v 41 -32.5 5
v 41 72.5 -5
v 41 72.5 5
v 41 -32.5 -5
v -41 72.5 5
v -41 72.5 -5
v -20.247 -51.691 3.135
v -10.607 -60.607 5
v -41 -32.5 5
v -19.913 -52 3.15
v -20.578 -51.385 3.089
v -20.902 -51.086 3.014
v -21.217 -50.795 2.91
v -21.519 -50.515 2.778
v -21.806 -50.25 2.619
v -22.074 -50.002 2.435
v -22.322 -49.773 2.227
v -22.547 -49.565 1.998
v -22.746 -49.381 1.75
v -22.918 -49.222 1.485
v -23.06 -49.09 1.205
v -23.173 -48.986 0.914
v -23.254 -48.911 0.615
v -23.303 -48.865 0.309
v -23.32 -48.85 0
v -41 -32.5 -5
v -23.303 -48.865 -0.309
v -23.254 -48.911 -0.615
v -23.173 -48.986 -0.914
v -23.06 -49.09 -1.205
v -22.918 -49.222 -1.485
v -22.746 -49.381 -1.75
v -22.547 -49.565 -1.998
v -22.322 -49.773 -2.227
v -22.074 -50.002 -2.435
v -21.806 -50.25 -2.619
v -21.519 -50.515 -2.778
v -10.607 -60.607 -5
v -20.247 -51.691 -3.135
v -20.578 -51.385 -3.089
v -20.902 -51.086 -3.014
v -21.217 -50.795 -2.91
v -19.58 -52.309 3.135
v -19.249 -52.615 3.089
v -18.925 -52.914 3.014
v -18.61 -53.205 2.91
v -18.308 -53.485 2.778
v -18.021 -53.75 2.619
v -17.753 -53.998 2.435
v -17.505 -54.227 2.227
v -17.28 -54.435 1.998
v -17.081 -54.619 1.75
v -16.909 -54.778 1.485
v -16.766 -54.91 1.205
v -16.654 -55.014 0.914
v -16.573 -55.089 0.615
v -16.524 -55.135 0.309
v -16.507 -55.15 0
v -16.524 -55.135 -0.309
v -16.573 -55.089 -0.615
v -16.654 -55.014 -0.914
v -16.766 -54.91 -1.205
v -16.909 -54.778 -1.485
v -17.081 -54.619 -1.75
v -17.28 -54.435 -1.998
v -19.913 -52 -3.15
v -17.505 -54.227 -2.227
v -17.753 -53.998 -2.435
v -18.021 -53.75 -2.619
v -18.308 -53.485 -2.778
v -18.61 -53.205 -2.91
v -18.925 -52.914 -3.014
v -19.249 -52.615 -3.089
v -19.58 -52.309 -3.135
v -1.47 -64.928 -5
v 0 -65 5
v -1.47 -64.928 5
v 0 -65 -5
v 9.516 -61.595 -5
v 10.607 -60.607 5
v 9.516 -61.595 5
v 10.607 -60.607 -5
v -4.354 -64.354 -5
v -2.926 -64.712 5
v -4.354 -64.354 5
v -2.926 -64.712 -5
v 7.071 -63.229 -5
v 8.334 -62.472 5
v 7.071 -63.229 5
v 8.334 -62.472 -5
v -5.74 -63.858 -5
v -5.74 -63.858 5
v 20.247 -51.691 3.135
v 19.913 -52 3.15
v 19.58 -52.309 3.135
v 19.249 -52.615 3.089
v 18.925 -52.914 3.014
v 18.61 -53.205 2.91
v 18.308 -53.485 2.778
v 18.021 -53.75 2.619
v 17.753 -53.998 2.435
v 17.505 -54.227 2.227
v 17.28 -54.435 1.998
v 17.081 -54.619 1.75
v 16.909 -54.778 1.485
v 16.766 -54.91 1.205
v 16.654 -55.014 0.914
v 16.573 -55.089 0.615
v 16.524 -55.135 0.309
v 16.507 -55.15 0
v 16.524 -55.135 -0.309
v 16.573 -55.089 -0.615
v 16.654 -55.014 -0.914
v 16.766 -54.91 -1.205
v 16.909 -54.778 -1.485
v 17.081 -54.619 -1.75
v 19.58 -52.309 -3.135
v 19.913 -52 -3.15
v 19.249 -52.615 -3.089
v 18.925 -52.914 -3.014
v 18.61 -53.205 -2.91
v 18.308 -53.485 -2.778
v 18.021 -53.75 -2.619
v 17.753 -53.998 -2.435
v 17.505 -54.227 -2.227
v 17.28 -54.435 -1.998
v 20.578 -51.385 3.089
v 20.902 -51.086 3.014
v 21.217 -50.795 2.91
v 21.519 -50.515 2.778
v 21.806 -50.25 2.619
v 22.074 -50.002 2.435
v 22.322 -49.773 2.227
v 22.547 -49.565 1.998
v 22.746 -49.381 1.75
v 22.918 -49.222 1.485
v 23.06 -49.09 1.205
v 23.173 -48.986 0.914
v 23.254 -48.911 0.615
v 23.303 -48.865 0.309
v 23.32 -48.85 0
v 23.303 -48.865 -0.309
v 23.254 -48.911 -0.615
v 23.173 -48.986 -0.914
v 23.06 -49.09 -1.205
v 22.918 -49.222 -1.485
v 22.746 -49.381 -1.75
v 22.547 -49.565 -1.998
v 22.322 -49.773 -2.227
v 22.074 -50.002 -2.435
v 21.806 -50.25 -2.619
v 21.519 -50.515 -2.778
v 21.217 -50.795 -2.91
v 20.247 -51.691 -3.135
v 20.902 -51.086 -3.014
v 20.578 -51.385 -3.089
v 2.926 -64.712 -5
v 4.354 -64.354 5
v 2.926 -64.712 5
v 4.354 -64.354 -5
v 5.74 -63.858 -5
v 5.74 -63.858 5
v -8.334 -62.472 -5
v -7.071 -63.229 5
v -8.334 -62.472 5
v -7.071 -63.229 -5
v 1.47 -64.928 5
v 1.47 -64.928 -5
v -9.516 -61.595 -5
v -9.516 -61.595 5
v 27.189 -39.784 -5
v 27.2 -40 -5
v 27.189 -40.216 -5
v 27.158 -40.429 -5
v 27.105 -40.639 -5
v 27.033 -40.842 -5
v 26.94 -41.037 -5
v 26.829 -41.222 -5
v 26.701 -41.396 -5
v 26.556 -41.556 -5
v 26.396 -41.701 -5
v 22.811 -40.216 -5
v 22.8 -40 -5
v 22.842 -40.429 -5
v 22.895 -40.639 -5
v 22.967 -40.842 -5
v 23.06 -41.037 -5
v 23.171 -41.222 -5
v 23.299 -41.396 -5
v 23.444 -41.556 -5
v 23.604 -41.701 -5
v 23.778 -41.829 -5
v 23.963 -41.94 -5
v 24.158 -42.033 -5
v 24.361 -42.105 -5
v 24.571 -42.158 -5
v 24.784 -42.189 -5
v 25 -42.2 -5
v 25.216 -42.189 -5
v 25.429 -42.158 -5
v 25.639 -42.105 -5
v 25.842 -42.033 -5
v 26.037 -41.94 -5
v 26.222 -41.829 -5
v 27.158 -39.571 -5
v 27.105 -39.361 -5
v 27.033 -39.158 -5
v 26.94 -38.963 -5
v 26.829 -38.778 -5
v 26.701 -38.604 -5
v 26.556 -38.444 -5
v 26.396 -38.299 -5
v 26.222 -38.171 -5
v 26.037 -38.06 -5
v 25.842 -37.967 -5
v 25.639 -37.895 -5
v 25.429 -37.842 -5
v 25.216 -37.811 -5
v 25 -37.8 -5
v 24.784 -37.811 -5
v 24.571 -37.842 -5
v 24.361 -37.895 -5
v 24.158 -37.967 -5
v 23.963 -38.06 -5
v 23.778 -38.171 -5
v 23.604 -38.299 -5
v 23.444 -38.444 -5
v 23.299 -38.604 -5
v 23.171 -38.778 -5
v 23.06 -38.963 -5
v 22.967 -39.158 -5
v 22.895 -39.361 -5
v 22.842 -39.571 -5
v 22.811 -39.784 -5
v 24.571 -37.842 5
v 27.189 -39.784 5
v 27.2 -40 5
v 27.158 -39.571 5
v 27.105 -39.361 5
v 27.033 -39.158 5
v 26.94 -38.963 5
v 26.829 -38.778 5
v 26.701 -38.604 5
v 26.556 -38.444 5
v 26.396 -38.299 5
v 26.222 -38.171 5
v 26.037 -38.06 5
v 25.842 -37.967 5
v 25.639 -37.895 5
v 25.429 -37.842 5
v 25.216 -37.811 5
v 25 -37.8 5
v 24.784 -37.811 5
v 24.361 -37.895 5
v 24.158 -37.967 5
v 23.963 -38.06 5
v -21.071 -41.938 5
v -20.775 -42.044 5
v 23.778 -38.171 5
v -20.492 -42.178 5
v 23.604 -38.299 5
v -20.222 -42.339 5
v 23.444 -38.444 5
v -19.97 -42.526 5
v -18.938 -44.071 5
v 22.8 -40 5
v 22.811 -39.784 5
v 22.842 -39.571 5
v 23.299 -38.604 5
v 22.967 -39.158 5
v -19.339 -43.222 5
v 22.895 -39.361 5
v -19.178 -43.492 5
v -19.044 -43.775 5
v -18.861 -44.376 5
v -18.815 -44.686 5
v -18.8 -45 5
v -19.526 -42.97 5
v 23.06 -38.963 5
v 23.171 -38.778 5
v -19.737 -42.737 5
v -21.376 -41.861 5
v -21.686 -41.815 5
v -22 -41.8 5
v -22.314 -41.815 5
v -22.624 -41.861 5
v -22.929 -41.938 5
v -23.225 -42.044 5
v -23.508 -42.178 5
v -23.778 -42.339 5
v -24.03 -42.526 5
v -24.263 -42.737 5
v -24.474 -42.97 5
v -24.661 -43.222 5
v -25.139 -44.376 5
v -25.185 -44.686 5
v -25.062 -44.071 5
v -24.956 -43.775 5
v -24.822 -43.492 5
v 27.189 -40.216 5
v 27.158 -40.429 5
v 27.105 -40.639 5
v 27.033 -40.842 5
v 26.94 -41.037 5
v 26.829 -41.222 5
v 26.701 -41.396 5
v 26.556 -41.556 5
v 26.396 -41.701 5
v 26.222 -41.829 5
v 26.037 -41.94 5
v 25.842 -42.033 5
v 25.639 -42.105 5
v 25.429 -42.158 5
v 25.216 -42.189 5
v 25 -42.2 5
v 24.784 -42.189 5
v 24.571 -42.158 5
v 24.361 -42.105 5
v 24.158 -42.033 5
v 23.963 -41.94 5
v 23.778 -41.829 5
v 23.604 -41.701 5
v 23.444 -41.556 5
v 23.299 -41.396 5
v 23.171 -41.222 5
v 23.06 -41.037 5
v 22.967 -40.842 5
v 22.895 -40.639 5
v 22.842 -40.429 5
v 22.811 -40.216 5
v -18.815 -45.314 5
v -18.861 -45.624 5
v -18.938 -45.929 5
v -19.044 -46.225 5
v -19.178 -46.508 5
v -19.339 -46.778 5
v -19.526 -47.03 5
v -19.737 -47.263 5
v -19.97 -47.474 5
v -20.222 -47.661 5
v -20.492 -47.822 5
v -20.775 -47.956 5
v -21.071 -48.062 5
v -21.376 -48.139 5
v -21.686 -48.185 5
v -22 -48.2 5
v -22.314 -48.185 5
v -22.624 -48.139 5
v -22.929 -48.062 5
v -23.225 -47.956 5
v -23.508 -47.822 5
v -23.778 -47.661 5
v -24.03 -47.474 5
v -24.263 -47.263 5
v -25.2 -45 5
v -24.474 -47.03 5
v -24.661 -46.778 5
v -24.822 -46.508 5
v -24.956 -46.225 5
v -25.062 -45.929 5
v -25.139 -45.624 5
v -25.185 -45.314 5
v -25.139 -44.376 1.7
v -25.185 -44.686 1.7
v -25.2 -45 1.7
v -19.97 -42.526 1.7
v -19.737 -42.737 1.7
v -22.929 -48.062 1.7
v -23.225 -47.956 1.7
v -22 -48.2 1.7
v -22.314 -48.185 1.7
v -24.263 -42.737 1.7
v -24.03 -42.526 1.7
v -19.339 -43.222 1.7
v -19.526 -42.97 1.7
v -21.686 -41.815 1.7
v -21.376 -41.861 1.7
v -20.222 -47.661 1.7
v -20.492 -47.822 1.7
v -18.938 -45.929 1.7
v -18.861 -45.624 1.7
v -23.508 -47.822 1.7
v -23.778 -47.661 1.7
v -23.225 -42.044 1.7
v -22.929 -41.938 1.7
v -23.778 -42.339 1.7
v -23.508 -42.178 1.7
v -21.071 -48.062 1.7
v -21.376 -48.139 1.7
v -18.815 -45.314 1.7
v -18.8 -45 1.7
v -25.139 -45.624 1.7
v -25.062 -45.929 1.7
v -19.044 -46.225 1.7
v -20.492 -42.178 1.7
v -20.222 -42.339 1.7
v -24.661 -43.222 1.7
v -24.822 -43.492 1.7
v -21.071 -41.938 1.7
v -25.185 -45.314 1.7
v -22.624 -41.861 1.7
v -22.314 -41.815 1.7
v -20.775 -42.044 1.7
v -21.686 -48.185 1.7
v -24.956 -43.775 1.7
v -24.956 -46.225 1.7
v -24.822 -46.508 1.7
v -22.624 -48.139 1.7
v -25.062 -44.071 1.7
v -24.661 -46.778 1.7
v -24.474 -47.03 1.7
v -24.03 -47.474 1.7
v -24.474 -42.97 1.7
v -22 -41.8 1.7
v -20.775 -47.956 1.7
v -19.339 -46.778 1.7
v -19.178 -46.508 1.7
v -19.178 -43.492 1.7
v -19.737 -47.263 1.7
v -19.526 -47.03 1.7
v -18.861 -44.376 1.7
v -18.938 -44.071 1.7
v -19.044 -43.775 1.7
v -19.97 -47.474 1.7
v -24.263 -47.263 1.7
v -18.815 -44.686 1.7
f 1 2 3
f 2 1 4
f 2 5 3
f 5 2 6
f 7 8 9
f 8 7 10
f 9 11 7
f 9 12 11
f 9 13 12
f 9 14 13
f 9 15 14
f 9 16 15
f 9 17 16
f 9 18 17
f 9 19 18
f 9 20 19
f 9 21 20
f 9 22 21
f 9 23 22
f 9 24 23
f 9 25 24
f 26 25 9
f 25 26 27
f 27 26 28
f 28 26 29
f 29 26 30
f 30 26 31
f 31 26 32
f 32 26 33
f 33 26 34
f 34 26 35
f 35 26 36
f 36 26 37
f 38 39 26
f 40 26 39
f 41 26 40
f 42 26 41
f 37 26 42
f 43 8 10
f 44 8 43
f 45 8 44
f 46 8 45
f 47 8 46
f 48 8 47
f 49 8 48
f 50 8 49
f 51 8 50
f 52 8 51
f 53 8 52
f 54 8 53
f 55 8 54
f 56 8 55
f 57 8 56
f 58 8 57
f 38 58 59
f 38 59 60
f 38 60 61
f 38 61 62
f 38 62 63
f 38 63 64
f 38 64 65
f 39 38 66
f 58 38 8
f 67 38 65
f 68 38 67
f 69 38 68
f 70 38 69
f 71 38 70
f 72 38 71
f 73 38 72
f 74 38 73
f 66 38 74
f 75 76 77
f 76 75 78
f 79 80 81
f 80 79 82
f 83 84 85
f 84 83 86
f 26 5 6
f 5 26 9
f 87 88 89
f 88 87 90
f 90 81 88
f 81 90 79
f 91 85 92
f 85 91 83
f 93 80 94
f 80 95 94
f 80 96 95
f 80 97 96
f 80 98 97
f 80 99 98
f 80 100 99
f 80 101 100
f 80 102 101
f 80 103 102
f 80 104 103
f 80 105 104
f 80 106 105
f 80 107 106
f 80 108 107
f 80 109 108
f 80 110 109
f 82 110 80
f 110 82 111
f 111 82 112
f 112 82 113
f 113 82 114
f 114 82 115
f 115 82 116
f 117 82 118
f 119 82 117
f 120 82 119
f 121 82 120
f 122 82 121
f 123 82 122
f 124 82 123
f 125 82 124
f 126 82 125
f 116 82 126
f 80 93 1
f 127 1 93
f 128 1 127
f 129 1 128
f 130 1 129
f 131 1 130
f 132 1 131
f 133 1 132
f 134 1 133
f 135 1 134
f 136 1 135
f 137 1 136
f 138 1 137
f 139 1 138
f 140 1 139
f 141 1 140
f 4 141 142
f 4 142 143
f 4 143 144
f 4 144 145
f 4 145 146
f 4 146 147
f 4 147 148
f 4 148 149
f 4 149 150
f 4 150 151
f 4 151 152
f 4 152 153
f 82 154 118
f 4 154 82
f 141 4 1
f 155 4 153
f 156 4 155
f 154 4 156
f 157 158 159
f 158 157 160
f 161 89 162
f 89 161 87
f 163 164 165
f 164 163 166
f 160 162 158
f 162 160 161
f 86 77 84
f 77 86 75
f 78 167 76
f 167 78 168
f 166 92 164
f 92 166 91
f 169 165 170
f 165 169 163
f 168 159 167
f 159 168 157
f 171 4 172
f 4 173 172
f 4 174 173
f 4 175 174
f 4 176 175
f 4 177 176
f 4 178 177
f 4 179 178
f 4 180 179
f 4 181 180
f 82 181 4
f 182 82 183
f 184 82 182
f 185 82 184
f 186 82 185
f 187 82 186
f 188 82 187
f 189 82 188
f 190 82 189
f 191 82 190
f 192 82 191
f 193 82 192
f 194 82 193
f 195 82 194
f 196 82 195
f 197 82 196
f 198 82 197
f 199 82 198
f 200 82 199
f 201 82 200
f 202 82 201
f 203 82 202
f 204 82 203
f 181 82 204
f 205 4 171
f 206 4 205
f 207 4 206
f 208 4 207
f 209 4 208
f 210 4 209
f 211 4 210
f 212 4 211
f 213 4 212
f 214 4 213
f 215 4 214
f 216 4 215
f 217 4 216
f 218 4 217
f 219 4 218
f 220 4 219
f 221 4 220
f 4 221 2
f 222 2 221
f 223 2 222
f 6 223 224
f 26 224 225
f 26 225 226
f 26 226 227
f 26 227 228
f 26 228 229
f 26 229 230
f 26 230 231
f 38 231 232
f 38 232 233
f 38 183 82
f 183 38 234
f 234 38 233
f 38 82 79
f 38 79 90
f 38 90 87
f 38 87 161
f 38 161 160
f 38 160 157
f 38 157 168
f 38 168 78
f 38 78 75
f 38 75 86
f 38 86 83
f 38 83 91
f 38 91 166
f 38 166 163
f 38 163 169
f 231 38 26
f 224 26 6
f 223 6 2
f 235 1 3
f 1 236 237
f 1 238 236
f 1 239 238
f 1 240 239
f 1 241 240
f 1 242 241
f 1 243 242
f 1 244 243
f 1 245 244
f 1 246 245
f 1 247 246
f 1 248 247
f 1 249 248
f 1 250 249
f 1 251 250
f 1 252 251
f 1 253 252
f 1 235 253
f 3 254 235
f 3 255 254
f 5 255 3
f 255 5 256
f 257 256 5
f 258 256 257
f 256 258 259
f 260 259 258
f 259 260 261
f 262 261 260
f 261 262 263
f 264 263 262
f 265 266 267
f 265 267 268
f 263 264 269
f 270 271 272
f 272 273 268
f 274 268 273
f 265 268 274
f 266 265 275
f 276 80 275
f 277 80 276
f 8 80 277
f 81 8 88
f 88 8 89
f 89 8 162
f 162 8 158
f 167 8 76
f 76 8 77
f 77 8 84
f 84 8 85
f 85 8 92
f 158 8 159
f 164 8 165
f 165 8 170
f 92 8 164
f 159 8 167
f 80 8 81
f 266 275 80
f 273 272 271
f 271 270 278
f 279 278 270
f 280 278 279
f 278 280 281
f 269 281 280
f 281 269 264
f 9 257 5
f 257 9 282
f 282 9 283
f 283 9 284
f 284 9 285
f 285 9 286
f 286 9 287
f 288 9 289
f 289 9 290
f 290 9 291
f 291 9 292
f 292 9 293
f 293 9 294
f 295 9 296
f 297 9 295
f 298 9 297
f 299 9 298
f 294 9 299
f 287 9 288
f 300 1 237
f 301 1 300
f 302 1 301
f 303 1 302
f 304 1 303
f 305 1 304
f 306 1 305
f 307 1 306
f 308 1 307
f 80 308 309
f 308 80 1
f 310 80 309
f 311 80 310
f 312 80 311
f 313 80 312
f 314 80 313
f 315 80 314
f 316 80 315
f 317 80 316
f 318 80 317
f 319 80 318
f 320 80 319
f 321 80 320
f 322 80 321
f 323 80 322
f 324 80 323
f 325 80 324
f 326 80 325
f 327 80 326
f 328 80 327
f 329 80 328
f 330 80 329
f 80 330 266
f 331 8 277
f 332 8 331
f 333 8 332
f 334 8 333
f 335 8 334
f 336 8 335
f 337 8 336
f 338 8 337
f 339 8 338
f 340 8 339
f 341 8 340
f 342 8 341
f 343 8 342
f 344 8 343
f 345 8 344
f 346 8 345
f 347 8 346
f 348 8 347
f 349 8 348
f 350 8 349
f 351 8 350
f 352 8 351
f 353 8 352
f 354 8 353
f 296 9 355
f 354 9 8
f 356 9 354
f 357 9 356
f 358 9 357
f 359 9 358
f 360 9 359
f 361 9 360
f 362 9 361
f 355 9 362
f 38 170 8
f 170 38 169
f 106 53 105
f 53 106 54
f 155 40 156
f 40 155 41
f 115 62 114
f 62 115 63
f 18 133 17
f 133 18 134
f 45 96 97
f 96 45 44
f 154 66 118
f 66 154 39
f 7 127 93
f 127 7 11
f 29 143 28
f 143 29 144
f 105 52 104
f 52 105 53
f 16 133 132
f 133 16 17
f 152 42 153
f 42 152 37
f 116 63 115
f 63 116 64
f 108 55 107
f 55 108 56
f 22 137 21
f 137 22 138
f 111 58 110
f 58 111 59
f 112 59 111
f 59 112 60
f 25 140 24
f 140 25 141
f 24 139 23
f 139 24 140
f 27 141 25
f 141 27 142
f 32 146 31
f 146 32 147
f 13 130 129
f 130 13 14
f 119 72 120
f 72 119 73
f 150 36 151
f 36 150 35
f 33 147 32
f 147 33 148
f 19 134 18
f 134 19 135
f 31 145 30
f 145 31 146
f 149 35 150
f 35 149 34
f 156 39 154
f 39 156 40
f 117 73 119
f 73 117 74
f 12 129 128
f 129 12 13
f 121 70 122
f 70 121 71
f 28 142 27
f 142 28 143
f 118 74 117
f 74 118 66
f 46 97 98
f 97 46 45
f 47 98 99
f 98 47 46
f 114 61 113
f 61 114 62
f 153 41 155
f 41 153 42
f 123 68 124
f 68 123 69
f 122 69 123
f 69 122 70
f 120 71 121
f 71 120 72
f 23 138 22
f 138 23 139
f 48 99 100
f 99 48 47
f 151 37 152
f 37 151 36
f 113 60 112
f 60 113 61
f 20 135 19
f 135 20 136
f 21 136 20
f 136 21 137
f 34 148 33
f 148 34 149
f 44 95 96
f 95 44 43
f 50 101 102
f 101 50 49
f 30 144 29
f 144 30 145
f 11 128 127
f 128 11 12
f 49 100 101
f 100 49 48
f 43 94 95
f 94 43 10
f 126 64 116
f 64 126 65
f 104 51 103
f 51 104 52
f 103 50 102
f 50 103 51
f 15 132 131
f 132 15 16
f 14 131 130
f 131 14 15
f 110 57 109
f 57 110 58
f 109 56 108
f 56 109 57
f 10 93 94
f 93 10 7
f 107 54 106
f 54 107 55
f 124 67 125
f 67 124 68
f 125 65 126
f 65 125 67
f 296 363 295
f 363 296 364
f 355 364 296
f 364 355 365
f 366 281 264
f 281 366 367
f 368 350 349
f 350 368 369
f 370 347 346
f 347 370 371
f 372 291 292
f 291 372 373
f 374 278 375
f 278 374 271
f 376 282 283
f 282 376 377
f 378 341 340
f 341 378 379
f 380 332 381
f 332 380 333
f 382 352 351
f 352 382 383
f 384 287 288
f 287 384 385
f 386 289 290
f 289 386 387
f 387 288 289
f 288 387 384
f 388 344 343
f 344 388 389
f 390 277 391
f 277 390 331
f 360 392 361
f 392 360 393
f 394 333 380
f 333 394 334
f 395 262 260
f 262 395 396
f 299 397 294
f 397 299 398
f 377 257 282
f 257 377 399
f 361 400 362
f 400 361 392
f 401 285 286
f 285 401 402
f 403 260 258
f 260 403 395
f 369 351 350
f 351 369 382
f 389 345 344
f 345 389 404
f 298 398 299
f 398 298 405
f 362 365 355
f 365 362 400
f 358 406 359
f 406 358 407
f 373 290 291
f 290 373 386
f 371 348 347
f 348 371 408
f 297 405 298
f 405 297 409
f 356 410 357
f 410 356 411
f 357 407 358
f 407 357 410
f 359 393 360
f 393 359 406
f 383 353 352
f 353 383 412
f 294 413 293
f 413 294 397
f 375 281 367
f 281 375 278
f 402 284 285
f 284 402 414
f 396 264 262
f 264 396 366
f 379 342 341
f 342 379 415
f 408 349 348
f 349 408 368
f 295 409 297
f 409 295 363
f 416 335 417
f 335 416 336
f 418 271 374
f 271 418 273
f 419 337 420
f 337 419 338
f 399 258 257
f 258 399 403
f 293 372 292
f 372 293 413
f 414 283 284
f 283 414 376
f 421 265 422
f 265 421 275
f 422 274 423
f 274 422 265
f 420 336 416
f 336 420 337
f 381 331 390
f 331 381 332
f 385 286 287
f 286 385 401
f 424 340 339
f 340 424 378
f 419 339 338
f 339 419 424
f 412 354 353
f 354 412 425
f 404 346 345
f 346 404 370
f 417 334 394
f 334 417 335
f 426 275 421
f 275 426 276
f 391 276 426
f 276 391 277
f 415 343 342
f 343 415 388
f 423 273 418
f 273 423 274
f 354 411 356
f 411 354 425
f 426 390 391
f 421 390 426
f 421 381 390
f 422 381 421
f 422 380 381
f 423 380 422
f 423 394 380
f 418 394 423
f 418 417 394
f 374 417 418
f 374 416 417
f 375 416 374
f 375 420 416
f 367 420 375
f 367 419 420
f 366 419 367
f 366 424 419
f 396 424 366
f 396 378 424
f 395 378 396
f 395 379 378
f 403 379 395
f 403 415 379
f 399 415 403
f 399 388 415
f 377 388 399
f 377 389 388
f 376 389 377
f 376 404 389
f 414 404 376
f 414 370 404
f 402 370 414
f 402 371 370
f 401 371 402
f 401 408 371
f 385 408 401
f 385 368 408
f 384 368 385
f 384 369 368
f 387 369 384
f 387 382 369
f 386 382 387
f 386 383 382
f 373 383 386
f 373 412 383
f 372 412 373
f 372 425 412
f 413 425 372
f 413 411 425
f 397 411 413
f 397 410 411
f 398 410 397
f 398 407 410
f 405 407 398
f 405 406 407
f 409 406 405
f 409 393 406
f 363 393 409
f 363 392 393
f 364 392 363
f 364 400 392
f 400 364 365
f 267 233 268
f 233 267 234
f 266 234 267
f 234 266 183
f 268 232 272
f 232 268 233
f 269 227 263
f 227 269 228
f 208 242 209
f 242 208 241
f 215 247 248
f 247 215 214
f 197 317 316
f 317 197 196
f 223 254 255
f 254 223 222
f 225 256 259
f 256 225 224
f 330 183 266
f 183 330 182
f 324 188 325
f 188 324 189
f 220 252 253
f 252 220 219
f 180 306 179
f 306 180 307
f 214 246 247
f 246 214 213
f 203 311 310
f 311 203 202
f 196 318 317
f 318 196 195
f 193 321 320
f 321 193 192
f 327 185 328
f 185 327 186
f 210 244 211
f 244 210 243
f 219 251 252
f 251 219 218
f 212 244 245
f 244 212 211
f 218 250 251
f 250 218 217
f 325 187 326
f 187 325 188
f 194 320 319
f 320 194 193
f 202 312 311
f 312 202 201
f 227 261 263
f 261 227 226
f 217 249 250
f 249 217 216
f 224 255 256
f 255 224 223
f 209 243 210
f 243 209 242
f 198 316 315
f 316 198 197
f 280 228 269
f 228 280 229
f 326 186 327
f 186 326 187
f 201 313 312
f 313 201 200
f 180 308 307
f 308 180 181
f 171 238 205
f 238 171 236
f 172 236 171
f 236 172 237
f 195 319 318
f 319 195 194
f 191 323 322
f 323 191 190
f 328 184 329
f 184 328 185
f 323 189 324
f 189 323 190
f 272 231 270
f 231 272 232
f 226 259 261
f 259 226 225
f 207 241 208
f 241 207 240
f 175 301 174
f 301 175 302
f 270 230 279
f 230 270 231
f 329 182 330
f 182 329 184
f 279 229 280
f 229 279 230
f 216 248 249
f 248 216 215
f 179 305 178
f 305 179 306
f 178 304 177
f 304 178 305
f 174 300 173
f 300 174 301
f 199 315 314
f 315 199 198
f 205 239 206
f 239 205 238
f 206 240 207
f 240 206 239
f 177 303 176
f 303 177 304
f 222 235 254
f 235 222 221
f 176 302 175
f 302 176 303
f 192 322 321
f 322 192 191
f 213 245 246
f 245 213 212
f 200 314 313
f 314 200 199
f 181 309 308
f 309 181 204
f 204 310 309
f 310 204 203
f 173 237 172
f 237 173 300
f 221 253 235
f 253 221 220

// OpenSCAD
// 135er Helicopter Controller - right toe brake V1.1
$fn=64;
plate_w=82; plate_h=150; plate_t=10;
pivot_d=6.3; pivot_y=-52;
magnet_d=6.4; magnet_h=3.2;
spring_d=4.4;

mirror([1,0,0])
difference(){
    hull(){
        translate([0,20,0]) cube([plate_w,105,plate_t],center=true);
        translate([0,-50,0]) cylinder(h=plate_t,d=30,center=true);
    }
    translate([0,pivot_y,0]) rotate([0,90,0]) cylinder(h=plate_w+4,d=pivot_d,center=true);
    translate([22,-45,plate_t/2-magnet_h/2]) cylinder(h=magnet_h+0.2,d=magnet_d,center=true);
    translate([-25,-40,0]) cylinder(h=plate_t+2,d=spring_d,center=true);
}
